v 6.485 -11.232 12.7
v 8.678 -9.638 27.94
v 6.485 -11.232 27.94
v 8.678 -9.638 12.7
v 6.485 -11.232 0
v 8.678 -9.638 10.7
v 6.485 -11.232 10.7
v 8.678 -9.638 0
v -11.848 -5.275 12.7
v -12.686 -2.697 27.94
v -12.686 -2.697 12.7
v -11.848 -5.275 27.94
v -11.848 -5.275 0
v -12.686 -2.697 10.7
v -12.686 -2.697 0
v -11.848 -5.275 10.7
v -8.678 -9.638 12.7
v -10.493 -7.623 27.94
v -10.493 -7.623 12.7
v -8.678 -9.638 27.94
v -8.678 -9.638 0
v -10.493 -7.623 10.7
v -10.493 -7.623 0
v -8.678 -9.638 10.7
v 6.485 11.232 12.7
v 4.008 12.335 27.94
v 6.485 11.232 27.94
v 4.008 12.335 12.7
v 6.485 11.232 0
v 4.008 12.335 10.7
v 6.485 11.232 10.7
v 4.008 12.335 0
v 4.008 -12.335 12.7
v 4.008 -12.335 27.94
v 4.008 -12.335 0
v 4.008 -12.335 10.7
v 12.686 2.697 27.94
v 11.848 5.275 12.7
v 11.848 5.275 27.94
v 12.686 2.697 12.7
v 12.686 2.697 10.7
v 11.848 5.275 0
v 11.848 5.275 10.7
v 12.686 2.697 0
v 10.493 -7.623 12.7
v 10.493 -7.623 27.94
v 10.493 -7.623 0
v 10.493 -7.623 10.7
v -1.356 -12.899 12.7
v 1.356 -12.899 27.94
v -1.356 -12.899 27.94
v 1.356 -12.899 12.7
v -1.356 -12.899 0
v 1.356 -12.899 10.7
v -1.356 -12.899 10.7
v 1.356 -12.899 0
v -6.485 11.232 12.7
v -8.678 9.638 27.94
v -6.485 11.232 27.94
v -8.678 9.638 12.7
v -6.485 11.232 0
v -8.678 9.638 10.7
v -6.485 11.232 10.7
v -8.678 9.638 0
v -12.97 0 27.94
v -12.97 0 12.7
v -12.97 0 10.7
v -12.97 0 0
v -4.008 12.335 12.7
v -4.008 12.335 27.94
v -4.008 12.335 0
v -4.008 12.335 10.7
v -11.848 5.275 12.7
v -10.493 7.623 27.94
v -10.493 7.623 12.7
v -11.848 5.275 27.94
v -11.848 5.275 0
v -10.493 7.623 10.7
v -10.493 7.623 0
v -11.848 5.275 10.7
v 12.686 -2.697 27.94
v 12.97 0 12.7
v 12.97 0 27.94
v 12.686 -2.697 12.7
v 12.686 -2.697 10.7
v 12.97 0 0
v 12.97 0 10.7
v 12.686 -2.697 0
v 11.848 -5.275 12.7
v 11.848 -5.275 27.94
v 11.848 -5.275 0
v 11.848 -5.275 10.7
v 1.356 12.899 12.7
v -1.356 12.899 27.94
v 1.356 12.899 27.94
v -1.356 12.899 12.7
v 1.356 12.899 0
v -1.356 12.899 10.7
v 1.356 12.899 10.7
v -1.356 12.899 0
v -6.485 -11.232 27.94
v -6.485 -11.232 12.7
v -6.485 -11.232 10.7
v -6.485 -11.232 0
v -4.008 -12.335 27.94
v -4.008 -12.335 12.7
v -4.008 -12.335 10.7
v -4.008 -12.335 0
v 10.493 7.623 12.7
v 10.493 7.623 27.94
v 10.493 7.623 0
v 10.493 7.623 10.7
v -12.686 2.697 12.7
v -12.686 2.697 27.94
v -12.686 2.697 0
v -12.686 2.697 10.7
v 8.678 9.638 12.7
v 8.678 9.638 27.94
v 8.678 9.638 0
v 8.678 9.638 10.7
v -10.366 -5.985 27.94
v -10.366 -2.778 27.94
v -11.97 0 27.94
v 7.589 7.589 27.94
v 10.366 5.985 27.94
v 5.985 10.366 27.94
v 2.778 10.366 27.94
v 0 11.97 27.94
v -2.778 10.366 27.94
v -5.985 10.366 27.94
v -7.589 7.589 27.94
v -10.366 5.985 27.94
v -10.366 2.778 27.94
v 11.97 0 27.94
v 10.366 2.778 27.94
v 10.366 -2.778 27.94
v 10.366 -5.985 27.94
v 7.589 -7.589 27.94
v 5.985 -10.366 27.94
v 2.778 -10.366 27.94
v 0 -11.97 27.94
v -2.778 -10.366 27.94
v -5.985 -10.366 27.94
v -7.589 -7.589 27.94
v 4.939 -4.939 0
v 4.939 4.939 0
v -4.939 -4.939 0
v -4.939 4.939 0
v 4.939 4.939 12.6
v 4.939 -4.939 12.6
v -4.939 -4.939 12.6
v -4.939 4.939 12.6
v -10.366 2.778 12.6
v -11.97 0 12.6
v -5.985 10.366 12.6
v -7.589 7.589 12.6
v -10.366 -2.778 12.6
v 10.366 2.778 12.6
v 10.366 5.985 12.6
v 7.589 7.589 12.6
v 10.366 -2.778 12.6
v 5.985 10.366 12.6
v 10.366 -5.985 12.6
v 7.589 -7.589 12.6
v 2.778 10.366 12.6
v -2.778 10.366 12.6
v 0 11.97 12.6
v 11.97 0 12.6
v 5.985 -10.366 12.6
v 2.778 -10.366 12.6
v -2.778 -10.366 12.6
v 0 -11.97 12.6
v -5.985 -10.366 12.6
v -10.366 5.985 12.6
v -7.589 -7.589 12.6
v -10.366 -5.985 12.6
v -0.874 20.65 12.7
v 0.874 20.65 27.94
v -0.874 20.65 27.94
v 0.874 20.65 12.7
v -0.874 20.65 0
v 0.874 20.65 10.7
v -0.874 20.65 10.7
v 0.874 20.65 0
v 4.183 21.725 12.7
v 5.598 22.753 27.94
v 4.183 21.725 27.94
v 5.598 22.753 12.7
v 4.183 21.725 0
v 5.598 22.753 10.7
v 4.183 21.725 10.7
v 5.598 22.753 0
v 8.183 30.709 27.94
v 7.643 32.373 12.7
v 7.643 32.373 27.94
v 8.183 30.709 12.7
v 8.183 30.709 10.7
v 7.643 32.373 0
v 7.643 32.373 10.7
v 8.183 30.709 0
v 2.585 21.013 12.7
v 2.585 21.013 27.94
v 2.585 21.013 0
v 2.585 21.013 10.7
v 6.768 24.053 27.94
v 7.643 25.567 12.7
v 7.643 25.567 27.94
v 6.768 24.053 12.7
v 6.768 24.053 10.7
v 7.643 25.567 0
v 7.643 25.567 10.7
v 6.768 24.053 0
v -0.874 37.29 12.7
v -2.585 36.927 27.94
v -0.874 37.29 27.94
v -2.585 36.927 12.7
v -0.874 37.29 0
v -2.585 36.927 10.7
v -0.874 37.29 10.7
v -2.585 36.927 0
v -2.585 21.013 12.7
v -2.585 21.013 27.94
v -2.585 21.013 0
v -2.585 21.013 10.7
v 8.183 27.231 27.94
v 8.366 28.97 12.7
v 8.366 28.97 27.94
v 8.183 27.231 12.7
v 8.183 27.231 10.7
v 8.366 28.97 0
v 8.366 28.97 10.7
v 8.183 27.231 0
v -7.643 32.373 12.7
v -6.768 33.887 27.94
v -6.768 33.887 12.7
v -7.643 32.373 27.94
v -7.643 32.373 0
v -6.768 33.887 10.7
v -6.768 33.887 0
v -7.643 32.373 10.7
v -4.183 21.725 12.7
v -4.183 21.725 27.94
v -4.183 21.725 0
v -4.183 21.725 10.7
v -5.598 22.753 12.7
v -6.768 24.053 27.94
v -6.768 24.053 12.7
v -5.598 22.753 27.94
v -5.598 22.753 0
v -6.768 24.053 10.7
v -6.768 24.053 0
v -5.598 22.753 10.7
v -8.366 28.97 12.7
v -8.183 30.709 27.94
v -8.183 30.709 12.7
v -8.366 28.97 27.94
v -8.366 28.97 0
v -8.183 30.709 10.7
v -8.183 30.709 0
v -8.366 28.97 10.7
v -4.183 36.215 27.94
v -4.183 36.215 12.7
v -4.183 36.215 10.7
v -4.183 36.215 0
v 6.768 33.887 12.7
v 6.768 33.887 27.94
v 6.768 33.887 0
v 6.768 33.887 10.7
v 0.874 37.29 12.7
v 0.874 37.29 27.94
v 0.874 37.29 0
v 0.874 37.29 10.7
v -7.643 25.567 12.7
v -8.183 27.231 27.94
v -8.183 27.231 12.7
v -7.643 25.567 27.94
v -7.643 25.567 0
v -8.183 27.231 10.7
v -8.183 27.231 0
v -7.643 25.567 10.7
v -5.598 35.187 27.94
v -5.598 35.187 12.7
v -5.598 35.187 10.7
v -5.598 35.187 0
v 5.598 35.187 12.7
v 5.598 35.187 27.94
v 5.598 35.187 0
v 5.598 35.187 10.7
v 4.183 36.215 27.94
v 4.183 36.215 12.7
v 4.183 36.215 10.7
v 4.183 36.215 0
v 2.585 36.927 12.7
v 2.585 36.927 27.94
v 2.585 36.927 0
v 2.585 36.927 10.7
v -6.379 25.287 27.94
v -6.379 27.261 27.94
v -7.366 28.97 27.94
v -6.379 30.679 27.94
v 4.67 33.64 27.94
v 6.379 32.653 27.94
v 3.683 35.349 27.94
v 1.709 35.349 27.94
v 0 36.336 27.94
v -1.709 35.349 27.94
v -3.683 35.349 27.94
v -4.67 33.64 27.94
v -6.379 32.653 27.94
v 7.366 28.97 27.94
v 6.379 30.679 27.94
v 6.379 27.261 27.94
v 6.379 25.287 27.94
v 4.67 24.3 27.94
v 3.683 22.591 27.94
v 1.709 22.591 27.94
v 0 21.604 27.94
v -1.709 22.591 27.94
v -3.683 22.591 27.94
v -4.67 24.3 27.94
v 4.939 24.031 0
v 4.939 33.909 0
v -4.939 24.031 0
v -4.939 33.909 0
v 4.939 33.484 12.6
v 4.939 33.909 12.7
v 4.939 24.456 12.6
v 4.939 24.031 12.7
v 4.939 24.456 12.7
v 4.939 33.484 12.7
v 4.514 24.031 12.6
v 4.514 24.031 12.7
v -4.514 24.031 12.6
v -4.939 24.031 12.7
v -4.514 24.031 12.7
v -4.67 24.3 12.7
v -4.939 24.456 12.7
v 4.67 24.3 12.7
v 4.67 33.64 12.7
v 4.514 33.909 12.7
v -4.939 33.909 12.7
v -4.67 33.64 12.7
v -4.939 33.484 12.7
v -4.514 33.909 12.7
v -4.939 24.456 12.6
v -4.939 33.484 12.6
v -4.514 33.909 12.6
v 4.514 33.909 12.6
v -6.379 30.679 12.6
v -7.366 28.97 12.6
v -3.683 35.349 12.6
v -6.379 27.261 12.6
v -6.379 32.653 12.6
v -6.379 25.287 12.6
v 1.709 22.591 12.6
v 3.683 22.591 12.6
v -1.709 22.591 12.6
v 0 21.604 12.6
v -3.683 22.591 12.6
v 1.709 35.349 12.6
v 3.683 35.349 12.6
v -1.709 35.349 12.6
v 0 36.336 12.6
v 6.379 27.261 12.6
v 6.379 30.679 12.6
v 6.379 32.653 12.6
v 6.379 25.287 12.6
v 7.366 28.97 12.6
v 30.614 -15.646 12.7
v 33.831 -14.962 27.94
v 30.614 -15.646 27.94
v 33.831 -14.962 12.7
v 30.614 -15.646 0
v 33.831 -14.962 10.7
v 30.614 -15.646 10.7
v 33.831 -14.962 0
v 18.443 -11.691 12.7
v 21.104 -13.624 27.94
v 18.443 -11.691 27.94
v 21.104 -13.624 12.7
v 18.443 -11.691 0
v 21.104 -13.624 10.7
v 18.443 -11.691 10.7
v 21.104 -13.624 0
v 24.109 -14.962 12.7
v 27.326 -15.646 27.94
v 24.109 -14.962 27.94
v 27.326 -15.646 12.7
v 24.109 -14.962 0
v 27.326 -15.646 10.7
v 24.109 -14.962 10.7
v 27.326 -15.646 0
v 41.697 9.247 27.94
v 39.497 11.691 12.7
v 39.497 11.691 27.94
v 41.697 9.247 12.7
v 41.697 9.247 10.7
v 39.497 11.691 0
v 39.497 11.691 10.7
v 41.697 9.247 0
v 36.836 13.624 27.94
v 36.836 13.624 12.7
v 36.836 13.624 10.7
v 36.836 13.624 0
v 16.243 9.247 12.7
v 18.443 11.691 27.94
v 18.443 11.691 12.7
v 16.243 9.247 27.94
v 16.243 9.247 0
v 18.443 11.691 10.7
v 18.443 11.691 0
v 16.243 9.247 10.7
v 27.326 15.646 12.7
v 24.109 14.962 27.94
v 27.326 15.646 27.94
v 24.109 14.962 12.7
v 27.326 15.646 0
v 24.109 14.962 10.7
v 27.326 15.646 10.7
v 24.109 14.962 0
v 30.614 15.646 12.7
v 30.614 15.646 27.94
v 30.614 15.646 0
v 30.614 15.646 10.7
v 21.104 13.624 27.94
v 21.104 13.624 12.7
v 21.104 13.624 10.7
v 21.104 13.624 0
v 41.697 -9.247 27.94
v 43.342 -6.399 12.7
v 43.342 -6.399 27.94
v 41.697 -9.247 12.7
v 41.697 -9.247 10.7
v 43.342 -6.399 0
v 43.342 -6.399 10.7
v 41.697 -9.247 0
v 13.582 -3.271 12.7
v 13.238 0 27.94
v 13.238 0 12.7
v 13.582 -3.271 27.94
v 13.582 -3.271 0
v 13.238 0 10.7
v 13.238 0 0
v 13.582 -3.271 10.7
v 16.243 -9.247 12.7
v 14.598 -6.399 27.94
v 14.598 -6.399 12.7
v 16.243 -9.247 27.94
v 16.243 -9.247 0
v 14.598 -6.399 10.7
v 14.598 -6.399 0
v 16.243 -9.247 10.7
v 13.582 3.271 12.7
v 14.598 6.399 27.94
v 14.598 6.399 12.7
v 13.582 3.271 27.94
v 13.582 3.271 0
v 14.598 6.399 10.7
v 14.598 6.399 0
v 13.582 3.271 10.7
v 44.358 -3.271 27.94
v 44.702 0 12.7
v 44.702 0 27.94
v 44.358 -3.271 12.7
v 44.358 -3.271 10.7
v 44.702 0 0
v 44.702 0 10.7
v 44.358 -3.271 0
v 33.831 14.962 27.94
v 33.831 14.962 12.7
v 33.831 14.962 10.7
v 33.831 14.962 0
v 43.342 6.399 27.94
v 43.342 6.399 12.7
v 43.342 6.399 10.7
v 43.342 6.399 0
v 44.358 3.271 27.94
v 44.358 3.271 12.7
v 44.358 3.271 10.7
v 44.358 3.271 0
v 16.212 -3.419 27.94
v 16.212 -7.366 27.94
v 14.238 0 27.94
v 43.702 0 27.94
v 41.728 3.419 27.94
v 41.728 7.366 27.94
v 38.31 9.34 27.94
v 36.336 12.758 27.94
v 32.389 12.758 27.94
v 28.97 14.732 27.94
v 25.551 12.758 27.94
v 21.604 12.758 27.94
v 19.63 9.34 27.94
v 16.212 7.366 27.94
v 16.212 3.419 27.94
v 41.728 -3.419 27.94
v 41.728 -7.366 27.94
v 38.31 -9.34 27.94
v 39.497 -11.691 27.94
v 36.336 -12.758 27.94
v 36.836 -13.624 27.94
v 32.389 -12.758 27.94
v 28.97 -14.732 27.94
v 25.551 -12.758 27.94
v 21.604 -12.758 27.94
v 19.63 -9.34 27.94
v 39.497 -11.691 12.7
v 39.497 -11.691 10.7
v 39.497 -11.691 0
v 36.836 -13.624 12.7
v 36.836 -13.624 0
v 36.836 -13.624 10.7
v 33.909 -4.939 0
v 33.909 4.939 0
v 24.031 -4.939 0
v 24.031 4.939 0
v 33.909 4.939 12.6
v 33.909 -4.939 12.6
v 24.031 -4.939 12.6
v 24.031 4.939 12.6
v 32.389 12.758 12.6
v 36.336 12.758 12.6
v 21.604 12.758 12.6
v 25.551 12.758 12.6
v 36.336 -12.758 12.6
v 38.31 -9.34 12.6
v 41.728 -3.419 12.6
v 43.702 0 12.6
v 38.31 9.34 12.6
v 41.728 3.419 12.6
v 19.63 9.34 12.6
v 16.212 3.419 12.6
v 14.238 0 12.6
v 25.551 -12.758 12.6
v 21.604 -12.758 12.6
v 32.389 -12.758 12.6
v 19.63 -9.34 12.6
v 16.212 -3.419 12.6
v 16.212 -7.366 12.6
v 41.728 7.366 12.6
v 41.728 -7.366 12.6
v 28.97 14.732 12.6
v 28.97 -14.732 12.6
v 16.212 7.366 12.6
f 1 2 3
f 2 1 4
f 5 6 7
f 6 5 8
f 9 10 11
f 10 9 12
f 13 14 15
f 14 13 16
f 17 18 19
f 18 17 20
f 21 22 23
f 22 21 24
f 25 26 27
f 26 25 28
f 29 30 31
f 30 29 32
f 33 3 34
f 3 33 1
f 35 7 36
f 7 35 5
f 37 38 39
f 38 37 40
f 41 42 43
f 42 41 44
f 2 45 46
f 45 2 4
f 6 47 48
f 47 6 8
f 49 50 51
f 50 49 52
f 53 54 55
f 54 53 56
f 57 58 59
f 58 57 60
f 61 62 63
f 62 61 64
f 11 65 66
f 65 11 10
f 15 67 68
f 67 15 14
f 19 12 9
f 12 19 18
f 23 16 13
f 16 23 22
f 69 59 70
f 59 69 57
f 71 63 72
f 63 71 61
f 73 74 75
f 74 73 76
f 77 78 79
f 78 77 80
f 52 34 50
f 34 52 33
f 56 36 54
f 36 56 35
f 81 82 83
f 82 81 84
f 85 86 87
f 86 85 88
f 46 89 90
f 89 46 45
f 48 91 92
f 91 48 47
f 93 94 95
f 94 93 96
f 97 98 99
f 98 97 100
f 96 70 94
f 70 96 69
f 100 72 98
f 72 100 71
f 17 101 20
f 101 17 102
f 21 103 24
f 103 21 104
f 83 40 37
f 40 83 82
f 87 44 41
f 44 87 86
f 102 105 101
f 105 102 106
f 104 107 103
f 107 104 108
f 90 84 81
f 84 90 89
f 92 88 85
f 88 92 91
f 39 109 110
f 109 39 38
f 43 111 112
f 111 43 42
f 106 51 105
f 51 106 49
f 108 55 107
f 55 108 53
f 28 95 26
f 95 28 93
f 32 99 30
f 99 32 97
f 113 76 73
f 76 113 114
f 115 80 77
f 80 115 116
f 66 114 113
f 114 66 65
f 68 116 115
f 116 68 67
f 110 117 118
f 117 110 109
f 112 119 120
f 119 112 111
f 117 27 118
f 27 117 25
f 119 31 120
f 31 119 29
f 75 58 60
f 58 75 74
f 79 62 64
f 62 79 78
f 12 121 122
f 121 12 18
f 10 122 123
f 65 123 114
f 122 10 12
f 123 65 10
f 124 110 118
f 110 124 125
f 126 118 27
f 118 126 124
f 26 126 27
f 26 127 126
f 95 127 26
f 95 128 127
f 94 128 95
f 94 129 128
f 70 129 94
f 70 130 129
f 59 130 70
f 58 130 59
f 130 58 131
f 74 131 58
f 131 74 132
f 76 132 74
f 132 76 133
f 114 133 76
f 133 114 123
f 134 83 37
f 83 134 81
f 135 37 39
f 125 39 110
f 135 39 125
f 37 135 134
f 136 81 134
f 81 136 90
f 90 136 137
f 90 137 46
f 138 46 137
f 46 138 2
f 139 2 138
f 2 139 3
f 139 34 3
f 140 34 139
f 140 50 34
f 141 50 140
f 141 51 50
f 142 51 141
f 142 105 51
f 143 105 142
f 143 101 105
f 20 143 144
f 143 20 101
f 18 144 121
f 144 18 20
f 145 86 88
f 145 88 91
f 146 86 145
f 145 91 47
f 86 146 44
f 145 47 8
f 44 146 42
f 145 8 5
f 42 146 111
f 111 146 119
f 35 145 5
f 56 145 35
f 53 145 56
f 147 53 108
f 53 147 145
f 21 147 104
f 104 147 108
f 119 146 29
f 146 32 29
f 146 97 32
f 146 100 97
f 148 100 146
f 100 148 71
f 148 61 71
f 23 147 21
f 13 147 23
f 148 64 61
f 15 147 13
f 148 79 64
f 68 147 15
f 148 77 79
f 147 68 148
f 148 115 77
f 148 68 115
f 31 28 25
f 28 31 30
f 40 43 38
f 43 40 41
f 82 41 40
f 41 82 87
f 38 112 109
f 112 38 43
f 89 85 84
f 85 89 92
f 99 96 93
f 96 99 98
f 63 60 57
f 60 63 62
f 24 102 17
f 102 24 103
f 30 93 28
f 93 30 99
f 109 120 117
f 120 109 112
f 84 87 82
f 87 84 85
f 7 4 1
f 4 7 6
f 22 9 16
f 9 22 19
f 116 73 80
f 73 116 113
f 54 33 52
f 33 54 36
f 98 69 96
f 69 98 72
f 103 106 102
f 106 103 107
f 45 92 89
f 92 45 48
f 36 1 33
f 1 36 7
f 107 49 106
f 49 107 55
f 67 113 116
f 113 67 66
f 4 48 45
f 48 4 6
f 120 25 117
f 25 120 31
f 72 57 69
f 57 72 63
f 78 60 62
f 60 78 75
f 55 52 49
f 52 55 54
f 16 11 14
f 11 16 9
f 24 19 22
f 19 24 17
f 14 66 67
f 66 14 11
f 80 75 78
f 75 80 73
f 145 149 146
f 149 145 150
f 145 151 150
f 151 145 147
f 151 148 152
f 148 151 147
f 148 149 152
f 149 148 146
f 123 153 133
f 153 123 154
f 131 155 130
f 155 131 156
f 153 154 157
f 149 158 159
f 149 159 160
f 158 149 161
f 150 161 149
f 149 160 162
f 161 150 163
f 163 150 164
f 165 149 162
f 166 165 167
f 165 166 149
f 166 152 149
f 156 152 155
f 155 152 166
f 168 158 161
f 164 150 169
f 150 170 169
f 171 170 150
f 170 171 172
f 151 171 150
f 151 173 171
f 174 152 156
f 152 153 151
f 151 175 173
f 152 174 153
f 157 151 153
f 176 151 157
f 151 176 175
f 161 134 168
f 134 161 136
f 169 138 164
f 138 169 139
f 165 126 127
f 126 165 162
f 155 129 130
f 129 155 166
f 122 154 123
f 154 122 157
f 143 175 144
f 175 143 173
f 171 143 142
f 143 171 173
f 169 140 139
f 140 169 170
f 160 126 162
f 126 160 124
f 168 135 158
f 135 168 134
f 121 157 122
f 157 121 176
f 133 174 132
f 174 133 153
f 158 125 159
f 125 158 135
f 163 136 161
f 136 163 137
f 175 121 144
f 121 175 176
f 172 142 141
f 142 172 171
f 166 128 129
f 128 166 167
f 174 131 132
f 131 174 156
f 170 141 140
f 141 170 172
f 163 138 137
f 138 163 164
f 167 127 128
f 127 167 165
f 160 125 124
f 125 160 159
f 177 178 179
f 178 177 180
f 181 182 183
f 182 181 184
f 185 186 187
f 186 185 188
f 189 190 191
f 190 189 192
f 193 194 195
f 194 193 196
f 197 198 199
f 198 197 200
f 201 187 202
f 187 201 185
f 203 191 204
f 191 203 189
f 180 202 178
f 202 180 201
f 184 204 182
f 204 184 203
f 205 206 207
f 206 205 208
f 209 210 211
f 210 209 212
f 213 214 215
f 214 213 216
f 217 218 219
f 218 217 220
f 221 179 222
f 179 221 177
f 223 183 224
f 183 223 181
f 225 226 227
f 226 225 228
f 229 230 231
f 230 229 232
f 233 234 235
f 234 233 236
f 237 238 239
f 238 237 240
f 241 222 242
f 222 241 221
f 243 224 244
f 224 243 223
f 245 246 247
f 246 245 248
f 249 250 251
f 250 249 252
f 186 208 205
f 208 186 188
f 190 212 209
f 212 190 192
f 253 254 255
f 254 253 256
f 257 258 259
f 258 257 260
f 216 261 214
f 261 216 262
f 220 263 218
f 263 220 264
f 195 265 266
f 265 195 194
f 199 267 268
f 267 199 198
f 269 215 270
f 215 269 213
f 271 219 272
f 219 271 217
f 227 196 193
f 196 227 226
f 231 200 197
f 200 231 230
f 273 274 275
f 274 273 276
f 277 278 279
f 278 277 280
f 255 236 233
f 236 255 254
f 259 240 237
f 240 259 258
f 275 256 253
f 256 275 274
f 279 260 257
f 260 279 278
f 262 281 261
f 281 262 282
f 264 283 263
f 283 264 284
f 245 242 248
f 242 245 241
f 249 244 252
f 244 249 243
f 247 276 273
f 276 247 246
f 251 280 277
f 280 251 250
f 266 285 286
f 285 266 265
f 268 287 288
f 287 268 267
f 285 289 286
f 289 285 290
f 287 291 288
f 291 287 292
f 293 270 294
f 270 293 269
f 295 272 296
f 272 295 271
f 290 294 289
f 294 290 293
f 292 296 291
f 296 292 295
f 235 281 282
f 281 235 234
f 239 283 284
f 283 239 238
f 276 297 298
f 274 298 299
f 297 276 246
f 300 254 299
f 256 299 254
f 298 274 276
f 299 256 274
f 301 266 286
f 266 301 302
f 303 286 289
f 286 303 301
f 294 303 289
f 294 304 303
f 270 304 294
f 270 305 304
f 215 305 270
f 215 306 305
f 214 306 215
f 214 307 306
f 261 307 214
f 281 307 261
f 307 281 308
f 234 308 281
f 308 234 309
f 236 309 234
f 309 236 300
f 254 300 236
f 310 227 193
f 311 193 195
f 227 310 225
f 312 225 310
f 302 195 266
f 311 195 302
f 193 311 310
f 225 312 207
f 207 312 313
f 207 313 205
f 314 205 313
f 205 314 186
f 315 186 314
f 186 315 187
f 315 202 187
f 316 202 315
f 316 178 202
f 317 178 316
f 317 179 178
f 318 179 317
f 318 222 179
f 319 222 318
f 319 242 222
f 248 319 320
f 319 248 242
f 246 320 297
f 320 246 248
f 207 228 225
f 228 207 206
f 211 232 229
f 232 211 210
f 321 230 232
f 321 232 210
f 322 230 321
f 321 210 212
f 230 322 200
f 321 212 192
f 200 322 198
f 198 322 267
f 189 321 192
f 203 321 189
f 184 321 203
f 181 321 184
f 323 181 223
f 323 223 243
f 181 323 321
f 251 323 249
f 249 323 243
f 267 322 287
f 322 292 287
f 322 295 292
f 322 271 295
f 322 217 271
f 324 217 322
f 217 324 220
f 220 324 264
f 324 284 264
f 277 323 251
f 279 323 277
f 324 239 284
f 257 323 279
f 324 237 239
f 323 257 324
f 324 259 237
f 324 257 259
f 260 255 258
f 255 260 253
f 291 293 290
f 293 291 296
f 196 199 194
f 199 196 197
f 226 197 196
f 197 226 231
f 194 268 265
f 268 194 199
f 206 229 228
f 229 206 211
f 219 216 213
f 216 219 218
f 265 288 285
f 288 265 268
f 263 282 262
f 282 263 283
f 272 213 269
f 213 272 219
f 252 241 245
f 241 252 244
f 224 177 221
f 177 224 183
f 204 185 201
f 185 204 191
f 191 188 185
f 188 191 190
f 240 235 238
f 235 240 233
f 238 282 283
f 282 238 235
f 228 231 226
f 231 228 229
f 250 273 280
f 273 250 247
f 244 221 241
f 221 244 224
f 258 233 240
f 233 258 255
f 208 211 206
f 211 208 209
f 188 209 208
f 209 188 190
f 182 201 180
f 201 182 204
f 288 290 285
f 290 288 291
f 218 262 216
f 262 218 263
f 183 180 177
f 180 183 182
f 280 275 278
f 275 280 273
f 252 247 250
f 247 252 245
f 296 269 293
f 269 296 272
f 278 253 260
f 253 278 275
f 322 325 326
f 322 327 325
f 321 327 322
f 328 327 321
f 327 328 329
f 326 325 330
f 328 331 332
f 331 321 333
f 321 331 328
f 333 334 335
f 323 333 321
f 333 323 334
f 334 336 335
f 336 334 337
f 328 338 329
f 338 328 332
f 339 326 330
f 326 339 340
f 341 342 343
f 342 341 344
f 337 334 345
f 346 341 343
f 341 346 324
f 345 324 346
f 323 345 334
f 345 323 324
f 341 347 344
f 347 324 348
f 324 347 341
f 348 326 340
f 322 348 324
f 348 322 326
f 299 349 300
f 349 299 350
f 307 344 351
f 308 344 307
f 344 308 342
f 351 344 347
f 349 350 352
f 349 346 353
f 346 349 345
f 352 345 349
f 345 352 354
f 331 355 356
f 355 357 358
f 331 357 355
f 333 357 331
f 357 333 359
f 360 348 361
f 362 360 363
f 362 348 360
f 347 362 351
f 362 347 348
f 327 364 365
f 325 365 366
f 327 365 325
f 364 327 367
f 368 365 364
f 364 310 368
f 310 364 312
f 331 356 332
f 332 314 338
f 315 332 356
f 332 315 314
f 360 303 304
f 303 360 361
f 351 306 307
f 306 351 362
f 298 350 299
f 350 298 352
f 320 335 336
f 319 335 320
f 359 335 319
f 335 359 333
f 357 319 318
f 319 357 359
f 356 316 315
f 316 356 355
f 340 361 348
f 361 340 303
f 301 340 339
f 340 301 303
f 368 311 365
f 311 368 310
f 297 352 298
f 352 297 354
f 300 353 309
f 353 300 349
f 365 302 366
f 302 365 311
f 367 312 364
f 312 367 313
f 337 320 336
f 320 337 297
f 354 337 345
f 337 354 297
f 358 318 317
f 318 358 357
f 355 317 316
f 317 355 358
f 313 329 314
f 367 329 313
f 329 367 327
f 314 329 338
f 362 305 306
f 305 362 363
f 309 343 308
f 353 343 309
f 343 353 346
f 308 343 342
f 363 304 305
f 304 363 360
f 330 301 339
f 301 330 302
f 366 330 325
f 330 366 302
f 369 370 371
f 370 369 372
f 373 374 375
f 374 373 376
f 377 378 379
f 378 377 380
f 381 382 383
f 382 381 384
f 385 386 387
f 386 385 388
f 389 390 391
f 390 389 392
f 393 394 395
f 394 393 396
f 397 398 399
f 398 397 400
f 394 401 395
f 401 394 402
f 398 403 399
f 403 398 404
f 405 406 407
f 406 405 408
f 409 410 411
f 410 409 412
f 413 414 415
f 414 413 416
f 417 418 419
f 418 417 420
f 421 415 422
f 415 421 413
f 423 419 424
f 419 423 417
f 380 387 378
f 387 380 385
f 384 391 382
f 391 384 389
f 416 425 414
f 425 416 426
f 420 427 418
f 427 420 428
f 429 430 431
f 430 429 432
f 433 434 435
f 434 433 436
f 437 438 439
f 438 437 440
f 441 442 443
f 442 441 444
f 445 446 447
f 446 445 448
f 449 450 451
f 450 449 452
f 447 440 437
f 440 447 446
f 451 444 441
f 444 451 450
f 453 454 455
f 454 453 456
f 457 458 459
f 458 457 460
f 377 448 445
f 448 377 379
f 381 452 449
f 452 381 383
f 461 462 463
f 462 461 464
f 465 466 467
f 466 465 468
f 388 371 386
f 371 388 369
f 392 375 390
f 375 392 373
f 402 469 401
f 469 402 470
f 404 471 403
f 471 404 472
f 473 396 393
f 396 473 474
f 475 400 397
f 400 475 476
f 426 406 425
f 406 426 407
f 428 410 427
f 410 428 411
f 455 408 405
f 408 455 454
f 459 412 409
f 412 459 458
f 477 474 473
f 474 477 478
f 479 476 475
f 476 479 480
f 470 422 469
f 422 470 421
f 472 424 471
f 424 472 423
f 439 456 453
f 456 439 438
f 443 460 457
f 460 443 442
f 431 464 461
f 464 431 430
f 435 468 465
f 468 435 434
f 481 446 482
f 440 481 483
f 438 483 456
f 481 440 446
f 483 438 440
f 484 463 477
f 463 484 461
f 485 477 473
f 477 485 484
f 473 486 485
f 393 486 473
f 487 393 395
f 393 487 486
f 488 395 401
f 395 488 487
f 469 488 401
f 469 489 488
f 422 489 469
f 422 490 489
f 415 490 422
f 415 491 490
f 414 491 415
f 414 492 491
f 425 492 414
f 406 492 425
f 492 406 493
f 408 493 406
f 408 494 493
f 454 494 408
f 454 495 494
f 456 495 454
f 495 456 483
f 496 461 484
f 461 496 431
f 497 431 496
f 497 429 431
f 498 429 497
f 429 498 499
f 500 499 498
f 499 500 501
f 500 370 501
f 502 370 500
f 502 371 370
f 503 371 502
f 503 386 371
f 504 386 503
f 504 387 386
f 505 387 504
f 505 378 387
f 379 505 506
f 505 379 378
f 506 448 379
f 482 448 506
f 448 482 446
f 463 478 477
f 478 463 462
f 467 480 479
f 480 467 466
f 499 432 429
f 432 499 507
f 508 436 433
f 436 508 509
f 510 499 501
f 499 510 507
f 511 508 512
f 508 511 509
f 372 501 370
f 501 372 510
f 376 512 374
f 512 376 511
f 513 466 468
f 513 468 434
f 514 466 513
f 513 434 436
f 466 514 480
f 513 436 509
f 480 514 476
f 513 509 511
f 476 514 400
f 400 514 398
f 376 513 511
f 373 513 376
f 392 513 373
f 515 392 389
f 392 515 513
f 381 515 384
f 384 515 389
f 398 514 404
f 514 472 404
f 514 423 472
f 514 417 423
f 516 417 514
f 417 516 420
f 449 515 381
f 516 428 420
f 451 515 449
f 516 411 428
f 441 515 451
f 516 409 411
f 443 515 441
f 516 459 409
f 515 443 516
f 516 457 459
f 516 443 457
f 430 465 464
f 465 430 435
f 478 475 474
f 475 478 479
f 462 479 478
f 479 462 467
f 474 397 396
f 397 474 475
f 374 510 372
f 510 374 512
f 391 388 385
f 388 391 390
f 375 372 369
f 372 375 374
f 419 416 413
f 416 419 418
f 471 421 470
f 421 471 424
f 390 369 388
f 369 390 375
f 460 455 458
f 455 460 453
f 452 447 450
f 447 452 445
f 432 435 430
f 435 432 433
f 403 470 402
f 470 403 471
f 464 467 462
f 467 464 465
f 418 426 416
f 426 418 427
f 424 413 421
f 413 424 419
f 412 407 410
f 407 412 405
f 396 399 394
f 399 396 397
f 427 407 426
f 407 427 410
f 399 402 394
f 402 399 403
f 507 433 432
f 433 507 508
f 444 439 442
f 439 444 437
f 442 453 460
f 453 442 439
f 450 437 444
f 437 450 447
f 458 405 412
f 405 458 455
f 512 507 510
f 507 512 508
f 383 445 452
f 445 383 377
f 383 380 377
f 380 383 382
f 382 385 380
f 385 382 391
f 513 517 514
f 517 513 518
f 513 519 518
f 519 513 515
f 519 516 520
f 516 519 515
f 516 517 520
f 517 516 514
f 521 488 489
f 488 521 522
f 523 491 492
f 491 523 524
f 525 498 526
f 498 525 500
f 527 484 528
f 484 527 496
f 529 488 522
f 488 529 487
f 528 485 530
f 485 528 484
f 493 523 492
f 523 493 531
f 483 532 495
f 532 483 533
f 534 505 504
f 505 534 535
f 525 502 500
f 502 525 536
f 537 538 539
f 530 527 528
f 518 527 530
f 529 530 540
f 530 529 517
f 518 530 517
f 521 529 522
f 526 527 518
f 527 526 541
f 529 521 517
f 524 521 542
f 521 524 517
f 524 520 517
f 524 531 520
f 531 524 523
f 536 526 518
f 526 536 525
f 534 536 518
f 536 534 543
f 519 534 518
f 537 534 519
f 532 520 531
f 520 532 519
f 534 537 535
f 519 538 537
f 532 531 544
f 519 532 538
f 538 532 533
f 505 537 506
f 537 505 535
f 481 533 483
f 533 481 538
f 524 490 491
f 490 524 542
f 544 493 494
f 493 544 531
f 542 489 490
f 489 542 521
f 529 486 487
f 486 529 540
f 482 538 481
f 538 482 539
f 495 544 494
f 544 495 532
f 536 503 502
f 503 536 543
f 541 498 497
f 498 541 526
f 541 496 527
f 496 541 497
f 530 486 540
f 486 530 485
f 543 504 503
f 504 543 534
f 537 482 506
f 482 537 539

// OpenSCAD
// Sockets

type = "Double Hex"; // [Hex, Double Hex]
base_size = .5;
base_depth = .5;
socket_sizes = [13/16,1/2,1];
socket_length = .6;
style = "Straight"; //[Tapered, Straight]
spacing = 15;
number = len(socket_sizes);
units = "Imperial"; //[Imperial, Metric]


xc = number;
yc = round(sqrt(number));
count = number;
if(units=="Imperial"){
    if(type == "Hex"){
        build_socket_imperial();
    }
    if(type == "Double Hex"){
        build_socket_imperial_double();
    }
}
else{
    if(type == "Hex"){
        build_socket_metric();
    }
    if(type == "Double Hex"){
        build_socket_metric_double();
    }
}
module build_socket_metric(){
    
    for(x=[0:xc-1]){
        for(y=[0:yc-1]){
            county= count-y;
            if(county>0){
                base_size = base_size*1.1;
                socket_sizes = socket_sizes*1.16;
                difference(){
                    union(){
                        translate([x*(base_size+         spacing),y*(base_size+spacing),base_depth+1]) linear_extrude (height = socket_length, center = false, convexity = 10) polygon(ngon(30, socket_sizes[y+(yc*x)]/2+1));
                        
                        
                        if(style == "Straight" && socket_sizes[y+(yc*x)] > base_size){
                            translate([x*(base_size+spacing),y*(base_size+spacing),0]) linear_extrude (height = base_depth, center = false, convexity = 10) polygon(ngon(30, socket_sizes[y+(yc*x)]/2+1));
                        }
                        else
                            {
                        translate([x*(base_size+spacing),y*(base_size+spacing),0]) linear_extrude (height = base_depth, center = false, convexity = 10) polygon(ngon(30, (base_size+2)/2));
                        }
                        if(socket_sizes[y+(yc*x)] > base_size){
                            translate([x*(base_size+spacing),y*(base_size+spacing),base_depth-2]) cylinder($fn=30, h = 3, r1 = socket_sizes[y+(yc*x)]/2+1, r2 = socket_sizes[y+(yc*x)]/2+1);
                        }
                        else{
                            translate([x*(base_size+spacing),y*(base_size+spacing),base_depth]) cylinder($fn=30, h = 3, r1 = base_size/2+1, r2 = socket_sizes[y+(yc*x)]/2+1);
                            }
                        
                    }
               translate([x*(base_size+spacing),y*(base_size+spacing),-.1]) linear_extrude (height = base_depth+.5, center = false, convexity = 10) polygon(ngon(4, base_size/2));
                    translate([x*(base_size+spacing),y*(base_size+spacing),base_depth-.5]) linear_extrude (height = socket_length+2, center = false, convexity = 10) polygon(ngon(6, socket_sizes[y+(yc*x)]/2));
                }
                
                
            }
        }
        count = count-x*yc;
    }
}

module build_socket_metric_double(){
    
    for(x=[0:xc-1]){
        for(y=[0:yc-1]){
            county= count-y;
            if(county>0){
                base_size = base_size*1.1;
                socket_sizes = socket_sizes*1.16;
                difference(){
                    union(){
                        translate([x*(base_size+         spacing),y*(base_size+spacing),base_depth+1]) linear_extrude (height = socket_length, center = false, convexity = 10) polygon(ngon(30, socket_sizes[y+(yc*x)]/2+1));
                        
                        
                        if(style == "Straight" && socket_sizes[y+(yc*x)] > base_size){
                            translate([x*(base_size+spacing),y*(base_size+spacing),0]) linear_extrude (height = base_depth, center = false, convexity = 10) polygon(ngon(30, socket_sizes[y+(yc*x)]/2+1));
                        }
                        else
                            {
                        translate([x*(base_size+spacing),y*(base_size+spacing),0]) linear_extrude (height = base_depth, center = false, convexity = 10) polygon(ngon(30, (base_size+2)/2));
                        }
                        if(socket_sizes[y+(yc*x)] > base_size){
                            translate([x*(base_size+spacing),y*(base_size+spacing),base_depth-2]) cylinder($fn=30, h = 3, r1 = socket_sizes[y+(yc*x)]/2+1, r2 = socket_sizes[y+(yc*x)]/2+1);
                        }
                        else{
                            translate([x*(base_size+spacing),y*(base_size+spacing),base_depth]) cylinder($fn=30, h = 3, r1 = base_size/2+1, r2 = socket_sizes[y+(yc*x)]/2+1);
                            }
                        
                    }
               translate([x*(base_size+spacing),y*(base_size+spacing),-.1]) linear_extrude (height = base_depth+.5, center = false, convexity = 10) polygon(ngon(4, base_size/2));
                    translate([x*(base_size+spacing),y*(base_size+spacing),base_depth-.5]) linear_extrude (height = socket_length+2, center = false, convexity = 10) polygon(ngon(6, socket_sizes[y+(yc*x)]/2));
                    translate([x*(base_size+spacing),y*(base_size+spacing),base_depth-.5]) rotate(30) linear_extrude (height = socket_length+2, center = false, convexity = 10) polygon(ngon(6, socket_sizes[y+(yc*x)]/2));
                }
                
                
            }
        }
        count = count-x*yc;
    }
}


module build_socket_imperial(){
    
    for(x=[0:xc-1]){
        for(y=[0:yc-1]){
            county= count-y;
            if(county>0){
                conv = 25.4;
                base_size = (base_size*conv)*1.1;
                base_depth = base_depth*conv;
                socket_sizes = (socket_sizes*conv)*1.16;
                socket_length = socket_length*conv;
                spacing = spacing;
                difference(){
                    union(){
                        translate([x*(base_size+spacing),y*(base_size+spacing),base_depth]) linear_extrude (height = socket_length, center = false, convexity = 10) polygon(ngon(30, socket_sizes[y+(yc*x)]/2+1));
  
                        if(style == "Straight" && socket_sizes[y+(yc*x)] > base_size){
                            translate([x*(base_size+spacing),y*(base_size+spacing),0]) linear_extrude (height = base_depth, center = false, convexity = 10) polygon(ngon(30, socket_sizes[y+(yc*x)]/2+1));
                        }
                        else
                            {
                        translate([x*(base_size+spacing),y*(base_size+spacing),0]) linear_extrude (height = base_depth, center = false, convexity = 10) polygon(ngon(30, (base_size+2)/2));
                        }
                        if(socket_sizes[y+(yc*x)] > base_size){
                            translate([x*(base_size+spacing),y*(base_size+spacing),base_depth-2]) cylinder($fn=30, h = 2, r1 = socket_sizes[y+(yc*x)]/2+1, r2 = socket_sizes[y+(yc*x)]/2+1);
                        }
                        else{
                            translate([x*(base_size+spacing),y*(base_size+spacing),base_depth]) cylinder($fn=30, h = 3, r1 = base_size/2+1, r2 = socket_sizes[y+(yc*x)]/2+1);
                            }
                    }
               translate([x*(base_size+spacing),y*(base_size+spacing),-.1]) rotate (45) linear_extrude (height = base_depth+.1, center = false, convexity = 10) polygon(ngon(4, base_size/2));
                    translate([x*(base_size+spacing),y*(base_size+spacing),base_depth-.1]) linear_extrude (height = socket_length+1, center = false, convexity = 10) polygon(ngon(6, socket_sizes[y+(yc*x)]/2));
                
                   
                    }
                
            }
        }
        count = count-x*yc;
    }
}

module build_socket_imperial_double(){
    
    for(x=[0:xc-1]){
        for(y=[0:yc-1]){
            county= count-y;
            if(county>0){
                conv = 25.4;
                base_size = (base_size*conv)*1.1;
                base_depth = base_depth*conv;
                socket_sizes = (socket_sizes*conv)*1.16;
                socket_length = socket_length*conv;
                spacing = spacing;
                difference(){
                    union(){
                        translate([x*(base_size+spacing),y*(base_size+spacing),base_depth]) linear_extrude (height = socket_length, center = false, convexity = 10) polygon(ngon(30, socket_sizes[y+(yc*x)]/2+1));
  
                        if(style == "Straight" && socket_sizes[y+(yc*x)] > base_size){
                            translate([x*(base_size+spacing),y*(base_size+spacing),0]) linear_extrude (height = base_depth, center = false, convexity = 10) polygon(ngon(30, socket_sizes[y+(yc*x)]/2+1));
                        }
                        else
                            {
                        translate([x*(base_size+spacing),y*(base_size+spacing),0]) linear_extrude (height = base_depth, center = false, convexity = 10) polygon(ngon(30, (base_size+2)/2));
                        }
                        if(socket_sizes[y+(yc*x)] > base_size){
                            translate([x*(base_size+spacing),y*(base_size+spacing),base_depth-2]) cylinder($fn=30, h = 2, r1 = socket_sizes[y+(yc*x)]/2+1, r2 = socket_sizes[y+(yc*x)]/2+1);
                        }
                        else{
                            translate([x*(base_size+spacing),y*(base_size+spacing),base_depth]) cylinder($fn=30, h = 3, r1 = base_size/2+1, r2 = socket_sizes[y+(yc*x)]/2+1);
                            }
                    }
               translate([x*(base_size+spacing),y*(base_size+spacing),-.1]) rotate (45) linear_extrude (height = base_depth+.1, center = false, convexity = 10) polygon(ngon(4, base_size/2));
                    translate([x*(base_size+spacing),y*(base_size+spacing),base_depth-.1]) linear_extrude (height = socket_length+1, center = false, convexity = 10) polygon(ngon(6, socket_sizes[y+(yc*x)]/2));
                    translate([x*(base_size+spacing),y*(base_size+spacing),base_depth-.1]) rotate(30) linear_extrude (height = socket_length+1, center = false, convexity = 10) polygon(ngon(6, socket_sizes[y+(yc*x)]/2));
                
                   
                    }
                
            }
        }
        count = count-x*yc;
    }
}

function ngon(num, r) = 
    [for (i=[0:num-1], a=i*360/num) [ r*cos(a), r*sin(a)]];
